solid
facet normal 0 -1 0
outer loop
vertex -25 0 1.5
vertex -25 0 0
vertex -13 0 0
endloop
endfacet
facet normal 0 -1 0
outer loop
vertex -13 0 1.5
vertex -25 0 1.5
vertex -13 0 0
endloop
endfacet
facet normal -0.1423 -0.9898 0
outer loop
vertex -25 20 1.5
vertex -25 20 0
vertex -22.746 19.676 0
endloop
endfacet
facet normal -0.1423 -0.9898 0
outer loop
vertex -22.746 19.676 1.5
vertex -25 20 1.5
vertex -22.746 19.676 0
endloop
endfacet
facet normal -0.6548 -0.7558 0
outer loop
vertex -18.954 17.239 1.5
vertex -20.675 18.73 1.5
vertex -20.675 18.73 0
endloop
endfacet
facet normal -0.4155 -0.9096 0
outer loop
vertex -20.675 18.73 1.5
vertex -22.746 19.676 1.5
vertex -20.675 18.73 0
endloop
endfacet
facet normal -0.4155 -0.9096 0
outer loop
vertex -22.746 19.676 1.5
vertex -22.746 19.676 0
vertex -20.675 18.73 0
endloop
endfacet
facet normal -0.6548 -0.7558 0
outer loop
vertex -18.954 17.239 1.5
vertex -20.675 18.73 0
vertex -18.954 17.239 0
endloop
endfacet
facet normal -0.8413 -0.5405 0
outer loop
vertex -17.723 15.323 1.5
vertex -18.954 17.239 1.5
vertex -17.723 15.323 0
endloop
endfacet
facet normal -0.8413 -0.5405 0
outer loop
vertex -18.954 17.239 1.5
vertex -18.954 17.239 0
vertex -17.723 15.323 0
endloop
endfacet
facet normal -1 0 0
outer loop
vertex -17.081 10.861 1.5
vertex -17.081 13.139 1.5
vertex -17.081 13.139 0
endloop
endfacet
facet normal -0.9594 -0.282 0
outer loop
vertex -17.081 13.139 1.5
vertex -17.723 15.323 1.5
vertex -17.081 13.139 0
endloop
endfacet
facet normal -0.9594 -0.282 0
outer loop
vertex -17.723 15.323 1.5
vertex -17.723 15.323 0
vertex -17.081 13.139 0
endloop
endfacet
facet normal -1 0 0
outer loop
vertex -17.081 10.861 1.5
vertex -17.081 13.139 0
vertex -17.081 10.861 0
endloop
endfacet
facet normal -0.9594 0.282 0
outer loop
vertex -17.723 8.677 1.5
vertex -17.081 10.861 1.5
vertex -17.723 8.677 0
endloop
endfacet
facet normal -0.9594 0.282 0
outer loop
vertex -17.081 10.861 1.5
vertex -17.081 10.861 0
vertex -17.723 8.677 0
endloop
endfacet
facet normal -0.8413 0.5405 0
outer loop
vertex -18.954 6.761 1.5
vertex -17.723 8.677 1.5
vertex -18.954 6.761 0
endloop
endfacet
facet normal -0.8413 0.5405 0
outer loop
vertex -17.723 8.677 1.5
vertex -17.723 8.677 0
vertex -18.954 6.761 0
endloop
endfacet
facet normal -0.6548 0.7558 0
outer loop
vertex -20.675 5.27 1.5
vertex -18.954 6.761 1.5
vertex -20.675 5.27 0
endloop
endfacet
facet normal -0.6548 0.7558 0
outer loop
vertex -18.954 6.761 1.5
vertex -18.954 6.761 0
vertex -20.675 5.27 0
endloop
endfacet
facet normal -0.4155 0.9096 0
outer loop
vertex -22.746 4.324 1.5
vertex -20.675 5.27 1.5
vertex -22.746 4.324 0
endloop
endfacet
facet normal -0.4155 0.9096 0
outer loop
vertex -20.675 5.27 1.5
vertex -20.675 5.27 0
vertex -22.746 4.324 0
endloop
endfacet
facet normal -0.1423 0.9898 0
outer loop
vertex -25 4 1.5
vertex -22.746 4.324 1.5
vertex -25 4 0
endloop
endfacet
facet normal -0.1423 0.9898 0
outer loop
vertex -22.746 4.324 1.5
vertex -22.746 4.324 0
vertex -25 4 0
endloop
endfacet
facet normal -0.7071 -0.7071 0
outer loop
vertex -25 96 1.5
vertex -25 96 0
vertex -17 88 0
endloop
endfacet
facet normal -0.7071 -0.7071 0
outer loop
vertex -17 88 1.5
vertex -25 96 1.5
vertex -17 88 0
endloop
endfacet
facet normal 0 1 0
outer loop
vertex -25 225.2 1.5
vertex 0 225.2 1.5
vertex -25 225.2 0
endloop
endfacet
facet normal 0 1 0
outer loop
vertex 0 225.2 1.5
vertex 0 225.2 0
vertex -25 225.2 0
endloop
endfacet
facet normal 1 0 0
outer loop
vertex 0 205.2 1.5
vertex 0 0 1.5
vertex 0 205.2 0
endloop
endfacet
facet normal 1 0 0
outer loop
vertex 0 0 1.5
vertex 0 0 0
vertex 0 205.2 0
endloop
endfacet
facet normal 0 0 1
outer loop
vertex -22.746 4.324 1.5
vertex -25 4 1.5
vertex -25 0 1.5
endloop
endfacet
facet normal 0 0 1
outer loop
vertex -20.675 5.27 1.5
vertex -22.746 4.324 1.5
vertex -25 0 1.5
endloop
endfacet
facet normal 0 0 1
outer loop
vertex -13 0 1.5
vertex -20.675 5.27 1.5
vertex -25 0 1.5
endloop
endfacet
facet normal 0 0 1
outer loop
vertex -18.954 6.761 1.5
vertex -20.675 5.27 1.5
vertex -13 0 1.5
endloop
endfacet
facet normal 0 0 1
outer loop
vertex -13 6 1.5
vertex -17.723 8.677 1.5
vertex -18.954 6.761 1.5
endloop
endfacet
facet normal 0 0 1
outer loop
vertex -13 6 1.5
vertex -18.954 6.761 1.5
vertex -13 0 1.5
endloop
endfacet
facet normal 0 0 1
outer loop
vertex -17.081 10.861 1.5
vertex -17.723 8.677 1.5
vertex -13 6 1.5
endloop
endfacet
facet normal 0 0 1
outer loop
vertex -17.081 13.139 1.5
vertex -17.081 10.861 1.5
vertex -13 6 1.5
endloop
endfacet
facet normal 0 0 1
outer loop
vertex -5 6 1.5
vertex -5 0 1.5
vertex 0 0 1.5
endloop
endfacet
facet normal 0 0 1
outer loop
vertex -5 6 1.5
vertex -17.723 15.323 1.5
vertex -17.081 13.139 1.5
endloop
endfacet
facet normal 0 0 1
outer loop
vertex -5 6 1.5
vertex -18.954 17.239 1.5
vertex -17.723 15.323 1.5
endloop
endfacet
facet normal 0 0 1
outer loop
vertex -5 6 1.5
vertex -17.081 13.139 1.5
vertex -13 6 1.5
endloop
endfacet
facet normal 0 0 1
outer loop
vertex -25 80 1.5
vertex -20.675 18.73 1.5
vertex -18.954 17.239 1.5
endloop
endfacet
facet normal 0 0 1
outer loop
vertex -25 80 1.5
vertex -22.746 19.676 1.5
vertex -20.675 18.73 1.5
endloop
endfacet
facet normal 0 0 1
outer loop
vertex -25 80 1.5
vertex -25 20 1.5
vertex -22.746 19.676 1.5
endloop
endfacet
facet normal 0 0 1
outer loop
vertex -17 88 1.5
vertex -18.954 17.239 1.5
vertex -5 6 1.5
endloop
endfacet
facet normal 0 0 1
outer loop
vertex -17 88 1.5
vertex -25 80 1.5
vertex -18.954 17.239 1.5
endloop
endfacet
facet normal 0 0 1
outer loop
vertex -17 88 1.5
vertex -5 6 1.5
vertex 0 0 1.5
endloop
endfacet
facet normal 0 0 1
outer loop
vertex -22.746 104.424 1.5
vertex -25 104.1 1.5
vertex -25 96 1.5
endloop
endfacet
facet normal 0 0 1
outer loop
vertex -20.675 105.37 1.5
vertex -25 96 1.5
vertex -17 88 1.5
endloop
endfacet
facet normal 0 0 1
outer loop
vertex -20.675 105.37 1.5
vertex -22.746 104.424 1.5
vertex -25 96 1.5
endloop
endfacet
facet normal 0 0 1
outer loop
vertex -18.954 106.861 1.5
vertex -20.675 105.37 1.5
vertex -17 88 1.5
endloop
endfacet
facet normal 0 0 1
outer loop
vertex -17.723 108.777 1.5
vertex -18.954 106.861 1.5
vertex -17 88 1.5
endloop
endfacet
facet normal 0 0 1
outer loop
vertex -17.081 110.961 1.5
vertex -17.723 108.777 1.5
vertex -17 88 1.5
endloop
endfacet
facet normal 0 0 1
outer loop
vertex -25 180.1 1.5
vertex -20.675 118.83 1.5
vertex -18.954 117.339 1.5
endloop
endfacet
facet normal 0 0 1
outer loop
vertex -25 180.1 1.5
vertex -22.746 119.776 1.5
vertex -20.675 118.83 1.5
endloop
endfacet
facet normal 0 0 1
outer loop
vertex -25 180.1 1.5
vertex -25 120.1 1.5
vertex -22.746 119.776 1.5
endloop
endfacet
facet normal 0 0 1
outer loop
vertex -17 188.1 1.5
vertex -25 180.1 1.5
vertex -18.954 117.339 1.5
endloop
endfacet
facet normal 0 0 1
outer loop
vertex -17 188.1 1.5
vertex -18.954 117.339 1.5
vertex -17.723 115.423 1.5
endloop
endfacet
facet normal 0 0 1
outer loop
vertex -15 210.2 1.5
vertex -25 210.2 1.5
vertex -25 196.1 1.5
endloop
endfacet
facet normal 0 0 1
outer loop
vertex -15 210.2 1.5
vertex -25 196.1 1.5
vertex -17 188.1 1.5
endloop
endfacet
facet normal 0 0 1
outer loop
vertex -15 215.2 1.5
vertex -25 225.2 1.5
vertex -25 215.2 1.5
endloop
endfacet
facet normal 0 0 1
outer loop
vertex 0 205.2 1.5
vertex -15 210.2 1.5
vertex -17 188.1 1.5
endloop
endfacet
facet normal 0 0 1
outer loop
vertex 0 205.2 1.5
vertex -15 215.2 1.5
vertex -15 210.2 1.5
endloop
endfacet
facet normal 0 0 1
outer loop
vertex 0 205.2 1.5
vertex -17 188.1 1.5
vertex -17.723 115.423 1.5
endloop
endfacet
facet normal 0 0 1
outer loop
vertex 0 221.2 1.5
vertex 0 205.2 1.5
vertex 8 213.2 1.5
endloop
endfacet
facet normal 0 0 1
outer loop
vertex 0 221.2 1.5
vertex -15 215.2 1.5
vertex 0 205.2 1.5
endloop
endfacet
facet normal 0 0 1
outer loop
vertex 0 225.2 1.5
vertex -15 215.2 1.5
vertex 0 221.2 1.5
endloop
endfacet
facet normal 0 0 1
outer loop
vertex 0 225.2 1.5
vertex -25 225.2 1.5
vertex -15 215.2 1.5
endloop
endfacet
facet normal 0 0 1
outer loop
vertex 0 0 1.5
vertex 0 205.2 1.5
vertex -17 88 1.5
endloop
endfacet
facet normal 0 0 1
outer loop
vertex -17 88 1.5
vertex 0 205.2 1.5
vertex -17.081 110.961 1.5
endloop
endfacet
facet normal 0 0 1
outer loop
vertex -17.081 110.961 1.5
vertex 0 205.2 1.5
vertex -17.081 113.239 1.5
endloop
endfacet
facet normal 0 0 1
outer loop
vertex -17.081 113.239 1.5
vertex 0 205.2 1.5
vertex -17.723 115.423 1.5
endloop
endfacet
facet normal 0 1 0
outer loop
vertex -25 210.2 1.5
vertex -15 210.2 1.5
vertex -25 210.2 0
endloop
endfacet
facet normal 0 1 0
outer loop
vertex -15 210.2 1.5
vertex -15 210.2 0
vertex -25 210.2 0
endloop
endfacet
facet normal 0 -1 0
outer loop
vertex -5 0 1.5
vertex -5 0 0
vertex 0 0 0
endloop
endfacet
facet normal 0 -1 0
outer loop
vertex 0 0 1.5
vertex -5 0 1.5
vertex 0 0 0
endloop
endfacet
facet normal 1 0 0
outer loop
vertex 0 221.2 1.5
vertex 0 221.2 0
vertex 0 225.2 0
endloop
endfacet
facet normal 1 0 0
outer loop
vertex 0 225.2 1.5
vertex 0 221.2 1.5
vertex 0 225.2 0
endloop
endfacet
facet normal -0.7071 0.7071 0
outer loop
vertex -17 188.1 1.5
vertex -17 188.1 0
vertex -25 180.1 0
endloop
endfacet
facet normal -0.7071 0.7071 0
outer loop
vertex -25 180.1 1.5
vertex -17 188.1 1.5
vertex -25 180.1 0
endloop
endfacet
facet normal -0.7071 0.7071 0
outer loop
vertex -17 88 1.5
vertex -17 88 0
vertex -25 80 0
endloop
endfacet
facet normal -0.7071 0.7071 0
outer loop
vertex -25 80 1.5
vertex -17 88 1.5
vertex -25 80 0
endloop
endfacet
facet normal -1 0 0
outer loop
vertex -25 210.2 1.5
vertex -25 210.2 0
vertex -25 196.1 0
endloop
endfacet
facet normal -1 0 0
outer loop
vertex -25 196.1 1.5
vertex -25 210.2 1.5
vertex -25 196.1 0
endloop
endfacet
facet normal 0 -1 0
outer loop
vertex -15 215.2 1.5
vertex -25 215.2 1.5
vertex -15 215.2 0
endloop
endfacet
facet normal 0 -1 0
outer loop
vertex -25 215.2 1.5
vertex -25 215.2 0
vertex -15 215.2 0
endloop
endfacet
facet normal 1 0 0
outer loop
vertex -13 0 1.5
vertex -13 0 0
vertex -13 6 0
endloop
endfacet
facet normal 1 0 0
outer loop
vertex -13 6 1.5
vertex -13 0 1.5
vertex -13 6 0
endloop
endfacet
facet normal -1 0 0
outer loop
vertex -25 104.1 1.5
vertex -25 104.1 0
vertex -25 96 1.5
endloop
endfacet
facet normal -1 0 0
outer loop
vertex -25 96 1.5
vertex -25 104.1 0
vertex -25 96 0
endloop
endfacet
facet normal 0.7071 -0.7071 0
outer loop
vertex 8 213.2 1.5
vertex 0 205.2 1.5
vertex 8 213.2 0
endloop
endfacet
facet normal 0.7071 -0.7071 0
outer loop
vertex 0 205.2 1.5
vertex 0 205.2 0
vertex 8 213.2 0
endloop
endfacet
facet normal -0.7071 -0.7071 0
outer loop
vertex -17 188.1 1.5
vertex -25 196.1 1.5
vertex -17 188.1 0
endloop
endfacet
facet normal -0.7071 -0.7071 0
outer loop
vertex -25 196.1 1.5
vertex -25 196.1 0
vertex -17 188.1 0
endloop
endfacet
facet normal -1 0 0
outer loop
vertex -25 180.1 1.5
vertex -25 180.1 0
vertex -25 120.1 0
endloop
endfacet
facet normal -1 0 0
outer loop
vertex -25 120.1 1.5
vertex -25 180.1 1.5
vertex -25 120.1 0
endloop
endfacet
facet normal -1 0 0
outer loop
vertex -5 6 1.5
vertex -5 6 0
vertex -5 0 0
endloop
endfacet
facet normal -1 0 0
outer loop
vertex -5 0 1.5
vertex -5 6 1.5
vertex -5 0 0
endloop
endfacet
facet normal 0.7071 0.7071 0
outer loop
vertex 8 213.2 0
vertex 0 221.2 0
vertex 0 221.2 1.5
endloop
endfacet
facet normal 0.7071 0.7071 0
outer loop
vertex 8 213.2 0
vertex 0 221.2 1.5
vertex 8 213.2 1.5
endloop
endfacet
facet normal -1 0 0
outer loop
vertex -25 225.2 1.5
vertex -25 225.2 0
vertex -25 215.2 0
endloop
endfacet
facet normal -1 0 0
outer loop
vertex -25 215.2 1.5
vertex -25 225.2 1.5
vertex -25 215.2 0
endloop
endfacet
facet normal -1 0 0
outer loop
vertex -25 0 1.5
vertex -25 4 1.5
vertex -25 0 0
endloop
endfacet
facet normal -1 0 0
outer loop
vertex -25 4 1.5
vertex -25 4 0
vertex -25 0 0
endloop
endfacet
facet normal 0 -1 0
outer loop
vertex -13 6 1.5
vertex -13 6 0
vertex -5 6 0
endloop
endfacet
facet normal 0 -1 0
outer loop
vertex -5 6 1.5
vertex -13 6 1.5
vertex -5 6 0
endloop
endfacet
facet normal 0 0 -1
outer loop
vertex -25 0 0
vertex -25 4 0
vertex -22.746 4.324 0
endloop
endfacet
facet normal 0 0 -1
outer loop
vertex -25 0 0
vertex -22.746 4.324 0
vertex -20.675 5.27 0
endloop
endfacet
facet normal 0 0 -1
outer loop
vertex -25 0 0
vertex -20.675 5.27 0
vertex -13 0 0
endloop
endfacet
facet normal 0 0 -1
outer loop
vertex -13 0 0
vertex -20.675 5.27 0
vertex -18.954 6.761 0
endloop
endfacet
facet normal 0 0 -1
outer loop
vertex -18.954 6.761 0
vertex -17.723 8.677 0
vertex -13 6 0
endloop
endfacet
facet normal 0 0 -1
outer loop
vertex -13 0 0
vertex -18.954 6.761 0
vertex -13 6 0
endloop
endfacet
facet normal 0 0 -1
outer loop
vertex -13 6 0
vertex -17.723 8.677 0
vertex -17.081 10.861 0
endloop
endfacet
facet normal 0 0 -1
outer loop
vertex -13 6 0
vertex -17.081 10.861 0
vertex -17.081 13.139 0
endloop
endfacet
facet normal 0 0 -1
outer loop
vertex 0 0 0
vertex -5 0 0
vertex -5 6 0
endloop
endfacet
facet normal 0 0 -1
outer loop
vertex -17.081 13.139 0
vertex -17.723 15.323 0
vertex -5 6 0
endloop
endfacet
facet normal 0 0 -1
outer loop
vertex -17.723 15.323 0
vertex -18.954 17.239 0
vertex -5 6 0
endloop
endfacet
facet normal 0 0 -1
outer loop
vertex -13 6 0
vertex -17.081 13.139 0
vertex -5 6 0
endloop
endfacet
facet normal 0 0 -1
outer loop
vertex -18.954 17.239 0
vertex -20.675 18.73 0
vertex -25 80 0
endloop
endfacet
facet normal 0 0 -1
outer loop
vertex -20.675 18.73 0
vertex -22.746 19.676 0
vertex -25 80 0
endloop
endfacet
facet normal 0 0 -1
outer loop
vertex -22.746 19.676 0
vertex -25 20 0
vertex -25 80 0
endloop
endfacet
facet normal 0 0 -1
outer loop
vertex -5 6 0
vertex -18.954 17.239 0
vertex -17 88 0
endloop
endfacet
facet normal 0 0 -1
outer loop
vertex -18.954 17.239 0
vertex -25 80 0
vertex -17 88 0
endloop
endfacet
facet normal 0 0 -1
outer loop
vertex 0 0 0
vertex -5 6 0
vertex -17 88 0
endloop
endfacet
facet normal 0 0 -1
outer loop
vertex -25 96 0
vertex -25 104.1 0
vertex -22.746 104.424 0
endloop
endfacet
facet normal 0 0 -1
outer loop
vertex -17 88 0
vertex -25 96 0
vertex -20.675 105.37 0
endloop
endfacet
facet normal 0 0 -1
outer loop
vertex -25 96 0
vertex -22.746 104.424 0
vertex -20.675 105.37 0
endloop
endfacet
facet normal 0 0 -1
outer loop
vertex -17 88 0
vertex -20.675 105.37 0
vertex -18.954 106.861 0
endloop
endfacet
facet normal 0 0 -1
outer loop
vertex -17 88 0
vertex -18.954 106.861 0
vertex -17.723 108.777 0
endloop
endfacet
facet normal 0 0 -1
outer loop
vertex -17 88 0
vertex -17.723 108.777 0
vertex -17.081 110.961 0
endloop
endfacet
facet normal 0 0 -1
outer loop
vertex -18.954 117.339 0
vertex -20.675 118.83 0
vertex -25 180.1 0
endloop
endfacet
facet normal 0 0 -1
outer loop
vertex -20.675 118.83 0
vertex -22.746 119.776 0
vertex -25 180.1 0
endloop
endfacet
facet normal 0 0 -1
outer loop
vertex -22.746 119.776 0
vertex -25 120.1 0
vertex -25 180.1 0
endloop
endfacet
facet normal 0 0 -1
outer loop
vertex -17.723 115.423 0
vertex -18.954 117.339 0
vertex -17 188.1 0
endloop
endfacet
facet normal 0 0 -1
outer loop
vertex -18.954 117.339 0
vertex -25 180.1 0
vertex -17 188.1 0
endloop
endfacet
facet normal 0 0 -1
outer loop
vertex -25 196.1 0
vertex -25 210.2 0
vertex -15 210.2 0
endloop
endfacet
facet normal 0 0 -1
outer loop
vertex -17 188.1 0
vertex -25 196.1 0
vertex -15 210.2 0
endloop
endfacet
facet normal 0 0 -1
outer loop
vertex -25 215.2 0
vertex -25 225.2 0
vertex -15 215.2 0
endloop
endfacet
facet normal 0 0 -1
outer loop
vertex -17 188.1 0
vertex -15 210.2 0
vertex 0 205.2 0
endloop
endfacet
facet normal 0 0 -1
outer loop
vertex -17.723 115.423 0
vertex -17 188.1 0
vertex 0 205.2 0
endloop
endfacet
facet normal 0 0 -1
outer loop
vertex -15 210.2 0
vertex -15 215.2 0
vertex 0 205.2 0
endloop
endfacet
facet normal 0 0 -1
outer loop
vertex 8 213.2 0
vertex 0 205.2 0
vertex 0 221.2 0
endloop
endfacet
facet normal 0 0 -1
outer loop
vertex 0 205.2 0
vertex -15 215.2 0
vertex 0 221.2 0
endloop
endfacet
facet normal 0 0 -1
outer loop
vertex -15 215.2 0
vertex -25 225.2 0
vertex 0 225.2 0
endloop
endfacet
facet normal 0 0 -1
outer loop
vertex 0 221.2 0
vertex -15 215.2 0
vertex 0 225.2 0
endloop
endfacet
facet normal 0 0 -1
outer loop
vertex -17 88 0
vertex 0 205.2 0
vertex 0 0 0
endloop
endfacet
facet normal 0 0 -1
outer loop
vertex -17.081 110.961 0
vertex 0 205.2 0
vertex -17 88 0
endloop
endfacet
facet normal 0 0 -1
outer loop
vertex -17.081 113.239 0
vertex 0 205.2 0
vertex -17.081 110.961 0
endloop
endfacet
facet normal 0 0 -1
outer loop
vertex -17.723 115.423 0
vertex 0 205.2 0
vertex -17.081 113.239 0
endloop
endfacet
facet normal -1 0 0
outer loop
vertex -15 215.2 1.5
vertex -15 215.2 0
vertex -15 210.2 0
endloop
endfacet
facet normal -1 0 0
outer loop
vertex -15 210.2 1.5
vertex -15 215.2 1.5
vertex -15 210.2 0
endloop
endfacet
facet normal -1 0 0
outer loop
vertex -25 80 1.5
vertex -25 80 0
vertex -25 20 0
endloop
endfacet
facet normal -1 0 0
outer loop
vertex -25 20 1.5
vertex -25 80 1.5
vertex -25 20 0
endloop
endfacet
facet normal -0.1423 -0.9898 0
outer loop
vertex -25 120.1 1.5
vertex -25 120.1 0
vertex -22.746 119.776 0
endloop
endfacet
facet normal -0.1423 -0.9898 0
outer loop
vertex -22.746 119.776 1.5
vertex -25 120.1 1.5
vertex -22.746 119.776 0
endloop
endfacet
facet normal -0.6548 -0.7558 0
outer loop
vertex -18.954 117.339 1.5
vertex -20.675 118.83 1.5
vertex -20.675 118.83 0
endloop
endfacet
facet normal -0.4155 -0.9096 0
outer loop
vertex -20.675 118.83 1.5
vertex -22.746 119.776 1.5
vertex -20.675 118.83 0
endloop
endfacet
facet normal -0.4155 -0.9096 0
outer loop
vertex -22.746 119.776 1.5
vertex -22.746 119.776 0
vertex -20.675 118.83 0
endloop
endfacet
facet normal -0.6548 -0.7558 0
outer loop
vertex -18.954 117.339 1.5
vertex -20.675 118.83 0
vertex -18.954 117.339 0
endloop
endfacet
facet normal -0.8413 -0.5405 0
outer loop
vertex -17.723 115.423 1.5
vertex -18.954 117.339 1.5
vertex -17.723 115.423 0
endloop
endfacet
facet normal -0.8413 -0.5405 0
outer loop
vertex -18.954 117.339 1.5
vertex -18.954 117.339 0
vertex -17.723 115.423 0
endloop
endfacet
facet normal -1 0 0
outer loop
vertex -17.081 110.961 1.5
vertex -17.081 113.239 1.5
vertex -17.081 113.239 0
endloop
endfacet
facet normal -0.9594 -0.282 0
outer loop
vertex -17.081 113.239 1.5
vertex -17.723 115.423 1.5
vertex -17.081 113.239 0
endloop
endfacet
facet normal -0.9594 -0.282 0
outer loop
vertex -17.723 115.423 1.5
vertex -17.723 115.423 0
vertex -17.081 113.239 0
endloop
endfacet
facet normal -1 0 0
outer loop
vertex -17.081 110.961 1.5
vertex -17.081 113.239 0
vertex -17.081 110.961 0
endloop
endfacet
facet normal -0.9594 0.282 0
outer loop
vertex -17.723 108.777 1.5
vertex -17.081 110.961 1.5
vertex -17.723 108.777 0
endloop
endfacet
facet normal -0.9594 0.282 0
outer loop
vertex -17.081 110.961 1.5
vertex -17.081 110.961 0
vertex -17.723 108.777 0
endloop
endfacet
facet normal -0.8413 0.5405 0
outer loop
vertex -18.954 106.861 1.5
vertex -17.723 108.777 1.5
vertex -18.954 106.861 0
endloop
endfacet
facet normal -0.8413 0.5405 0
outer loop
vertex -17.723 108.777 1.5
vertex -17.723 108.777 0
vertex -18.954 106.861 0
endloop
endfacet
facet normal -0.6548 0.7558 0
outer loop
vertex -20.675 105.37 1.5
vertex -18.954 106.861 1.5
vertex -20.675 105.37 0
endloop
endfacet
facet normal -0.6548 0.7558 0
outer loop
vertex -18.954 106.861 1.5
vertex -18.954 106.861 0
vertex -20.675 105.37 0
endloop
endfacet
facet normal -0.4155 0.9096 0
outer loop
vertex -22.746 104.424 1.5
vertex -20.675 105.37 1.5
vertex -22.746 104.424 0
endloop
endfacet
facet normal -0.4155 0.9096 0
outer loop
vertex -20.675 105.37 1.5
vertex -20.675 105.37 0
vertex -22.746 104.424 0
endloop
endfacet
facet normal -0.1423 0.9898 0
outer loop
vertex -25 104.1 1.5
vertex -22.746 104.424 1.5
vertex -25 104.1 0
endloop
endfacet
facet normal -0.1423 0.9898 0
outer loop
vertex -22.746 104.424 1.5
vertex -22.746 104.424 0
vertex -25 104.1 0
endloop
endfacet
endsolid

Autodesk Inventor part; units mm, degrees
ref_plane "YZ Plane" through (0, 0, 0) normal (1, 0, 0) x (0, 1, 0)
ref_plane "XZ Plane" through (0, 0, 0) normal (0, 1, 0) x (-1, 0, 0)
ref_plane "XY Plane" through (0, 0, 0) normal (0, 0, 1) x (1, 0, 0)
sketch "Sketch1" plane through (0, 0, 0) normal (0, 0, 1) x (1, 0, 0)
  circle A0 centre (0, 213.2) radius 8 construction
  line L0 (0, 221.2) -> (8, 213.2)
  line L1 (0, 205.2) -> (8, 213.2)
  line L2 (0, 0) -> (0, 205.2)
  line L3 (0, 225.2) -> (-25, 225.2)
  line L4 (-25, 0) -> (-13, 0)
  line L5 (-13, 0) -> (-13, 6)
  line L6 (-13, 6) -> (-5, 6)
  line L7 (-5, 6) -> (-5, 0)
  line L8 (-25, 0) -> (-13, 0)
  line L9 (-5, 0) -> (0, 0)
  line L10 (-25, 196.1) -> (-17, 188.1)
  line L11 (-17, 188.1) -> (-25, 180.1)
  arc A1 (-25, 104.1) -> (-25, 120.1) centre (-25, 112.1) ccw
  line L12 (-25, 180.1) -> (-25, 120.1)
  circle A2 centre (-25, 188.1) radius 8 construction
  line L13 (0, 221.2) -> (0, 225.2)
  line L14 (-25, 215.2) -> (-15, 215.2)
  line L15 (-15, 215.2) -> (-15, 210.2)
  line L16 (-15, 210.2) -> (-25, 210.2)
  line L17 (-25, 225.2) -> (-25, 215.2)
  line L18 (-25, 210.2) -> (-25, 196.1)
  arc A3 (-25, 4) -> (-25, 20) centre (-25, 12) ccw
  line L19 (-25, 4) -> (-25, 0)
  line L20 (-25, 96) -> (-17, 88)
  line L21 (-17, 88) -> (-25, 80)
  circle A4 centre (-25, 88) radius 8 construction
  line L22 (-25, 104.1) -> (-25, 96)
  line L23 (-25, 80) -> (-25, 20)
  dimension "d5" = 16
  dimension "d168" = 25
  dimension "d177" = 12
  dimension "d178" = 6
  dimension "d179" = 8
  dimension "d189" = 76
  dimension "d193" = 4
  dimension "d194" = 10
  dimension "d195" = 5
  dimension "d196" = 225.2
  dimension "d197" = 10
  dimension "d198" = 37.1
  dimension "d199" = 76
  dimension "d200" = 24.1
  dimension "d201" = 5
extrude "Extrusion10" add sketch "Sketch1" along normal blind 1.5
properties part number "MS_FI_v3"
